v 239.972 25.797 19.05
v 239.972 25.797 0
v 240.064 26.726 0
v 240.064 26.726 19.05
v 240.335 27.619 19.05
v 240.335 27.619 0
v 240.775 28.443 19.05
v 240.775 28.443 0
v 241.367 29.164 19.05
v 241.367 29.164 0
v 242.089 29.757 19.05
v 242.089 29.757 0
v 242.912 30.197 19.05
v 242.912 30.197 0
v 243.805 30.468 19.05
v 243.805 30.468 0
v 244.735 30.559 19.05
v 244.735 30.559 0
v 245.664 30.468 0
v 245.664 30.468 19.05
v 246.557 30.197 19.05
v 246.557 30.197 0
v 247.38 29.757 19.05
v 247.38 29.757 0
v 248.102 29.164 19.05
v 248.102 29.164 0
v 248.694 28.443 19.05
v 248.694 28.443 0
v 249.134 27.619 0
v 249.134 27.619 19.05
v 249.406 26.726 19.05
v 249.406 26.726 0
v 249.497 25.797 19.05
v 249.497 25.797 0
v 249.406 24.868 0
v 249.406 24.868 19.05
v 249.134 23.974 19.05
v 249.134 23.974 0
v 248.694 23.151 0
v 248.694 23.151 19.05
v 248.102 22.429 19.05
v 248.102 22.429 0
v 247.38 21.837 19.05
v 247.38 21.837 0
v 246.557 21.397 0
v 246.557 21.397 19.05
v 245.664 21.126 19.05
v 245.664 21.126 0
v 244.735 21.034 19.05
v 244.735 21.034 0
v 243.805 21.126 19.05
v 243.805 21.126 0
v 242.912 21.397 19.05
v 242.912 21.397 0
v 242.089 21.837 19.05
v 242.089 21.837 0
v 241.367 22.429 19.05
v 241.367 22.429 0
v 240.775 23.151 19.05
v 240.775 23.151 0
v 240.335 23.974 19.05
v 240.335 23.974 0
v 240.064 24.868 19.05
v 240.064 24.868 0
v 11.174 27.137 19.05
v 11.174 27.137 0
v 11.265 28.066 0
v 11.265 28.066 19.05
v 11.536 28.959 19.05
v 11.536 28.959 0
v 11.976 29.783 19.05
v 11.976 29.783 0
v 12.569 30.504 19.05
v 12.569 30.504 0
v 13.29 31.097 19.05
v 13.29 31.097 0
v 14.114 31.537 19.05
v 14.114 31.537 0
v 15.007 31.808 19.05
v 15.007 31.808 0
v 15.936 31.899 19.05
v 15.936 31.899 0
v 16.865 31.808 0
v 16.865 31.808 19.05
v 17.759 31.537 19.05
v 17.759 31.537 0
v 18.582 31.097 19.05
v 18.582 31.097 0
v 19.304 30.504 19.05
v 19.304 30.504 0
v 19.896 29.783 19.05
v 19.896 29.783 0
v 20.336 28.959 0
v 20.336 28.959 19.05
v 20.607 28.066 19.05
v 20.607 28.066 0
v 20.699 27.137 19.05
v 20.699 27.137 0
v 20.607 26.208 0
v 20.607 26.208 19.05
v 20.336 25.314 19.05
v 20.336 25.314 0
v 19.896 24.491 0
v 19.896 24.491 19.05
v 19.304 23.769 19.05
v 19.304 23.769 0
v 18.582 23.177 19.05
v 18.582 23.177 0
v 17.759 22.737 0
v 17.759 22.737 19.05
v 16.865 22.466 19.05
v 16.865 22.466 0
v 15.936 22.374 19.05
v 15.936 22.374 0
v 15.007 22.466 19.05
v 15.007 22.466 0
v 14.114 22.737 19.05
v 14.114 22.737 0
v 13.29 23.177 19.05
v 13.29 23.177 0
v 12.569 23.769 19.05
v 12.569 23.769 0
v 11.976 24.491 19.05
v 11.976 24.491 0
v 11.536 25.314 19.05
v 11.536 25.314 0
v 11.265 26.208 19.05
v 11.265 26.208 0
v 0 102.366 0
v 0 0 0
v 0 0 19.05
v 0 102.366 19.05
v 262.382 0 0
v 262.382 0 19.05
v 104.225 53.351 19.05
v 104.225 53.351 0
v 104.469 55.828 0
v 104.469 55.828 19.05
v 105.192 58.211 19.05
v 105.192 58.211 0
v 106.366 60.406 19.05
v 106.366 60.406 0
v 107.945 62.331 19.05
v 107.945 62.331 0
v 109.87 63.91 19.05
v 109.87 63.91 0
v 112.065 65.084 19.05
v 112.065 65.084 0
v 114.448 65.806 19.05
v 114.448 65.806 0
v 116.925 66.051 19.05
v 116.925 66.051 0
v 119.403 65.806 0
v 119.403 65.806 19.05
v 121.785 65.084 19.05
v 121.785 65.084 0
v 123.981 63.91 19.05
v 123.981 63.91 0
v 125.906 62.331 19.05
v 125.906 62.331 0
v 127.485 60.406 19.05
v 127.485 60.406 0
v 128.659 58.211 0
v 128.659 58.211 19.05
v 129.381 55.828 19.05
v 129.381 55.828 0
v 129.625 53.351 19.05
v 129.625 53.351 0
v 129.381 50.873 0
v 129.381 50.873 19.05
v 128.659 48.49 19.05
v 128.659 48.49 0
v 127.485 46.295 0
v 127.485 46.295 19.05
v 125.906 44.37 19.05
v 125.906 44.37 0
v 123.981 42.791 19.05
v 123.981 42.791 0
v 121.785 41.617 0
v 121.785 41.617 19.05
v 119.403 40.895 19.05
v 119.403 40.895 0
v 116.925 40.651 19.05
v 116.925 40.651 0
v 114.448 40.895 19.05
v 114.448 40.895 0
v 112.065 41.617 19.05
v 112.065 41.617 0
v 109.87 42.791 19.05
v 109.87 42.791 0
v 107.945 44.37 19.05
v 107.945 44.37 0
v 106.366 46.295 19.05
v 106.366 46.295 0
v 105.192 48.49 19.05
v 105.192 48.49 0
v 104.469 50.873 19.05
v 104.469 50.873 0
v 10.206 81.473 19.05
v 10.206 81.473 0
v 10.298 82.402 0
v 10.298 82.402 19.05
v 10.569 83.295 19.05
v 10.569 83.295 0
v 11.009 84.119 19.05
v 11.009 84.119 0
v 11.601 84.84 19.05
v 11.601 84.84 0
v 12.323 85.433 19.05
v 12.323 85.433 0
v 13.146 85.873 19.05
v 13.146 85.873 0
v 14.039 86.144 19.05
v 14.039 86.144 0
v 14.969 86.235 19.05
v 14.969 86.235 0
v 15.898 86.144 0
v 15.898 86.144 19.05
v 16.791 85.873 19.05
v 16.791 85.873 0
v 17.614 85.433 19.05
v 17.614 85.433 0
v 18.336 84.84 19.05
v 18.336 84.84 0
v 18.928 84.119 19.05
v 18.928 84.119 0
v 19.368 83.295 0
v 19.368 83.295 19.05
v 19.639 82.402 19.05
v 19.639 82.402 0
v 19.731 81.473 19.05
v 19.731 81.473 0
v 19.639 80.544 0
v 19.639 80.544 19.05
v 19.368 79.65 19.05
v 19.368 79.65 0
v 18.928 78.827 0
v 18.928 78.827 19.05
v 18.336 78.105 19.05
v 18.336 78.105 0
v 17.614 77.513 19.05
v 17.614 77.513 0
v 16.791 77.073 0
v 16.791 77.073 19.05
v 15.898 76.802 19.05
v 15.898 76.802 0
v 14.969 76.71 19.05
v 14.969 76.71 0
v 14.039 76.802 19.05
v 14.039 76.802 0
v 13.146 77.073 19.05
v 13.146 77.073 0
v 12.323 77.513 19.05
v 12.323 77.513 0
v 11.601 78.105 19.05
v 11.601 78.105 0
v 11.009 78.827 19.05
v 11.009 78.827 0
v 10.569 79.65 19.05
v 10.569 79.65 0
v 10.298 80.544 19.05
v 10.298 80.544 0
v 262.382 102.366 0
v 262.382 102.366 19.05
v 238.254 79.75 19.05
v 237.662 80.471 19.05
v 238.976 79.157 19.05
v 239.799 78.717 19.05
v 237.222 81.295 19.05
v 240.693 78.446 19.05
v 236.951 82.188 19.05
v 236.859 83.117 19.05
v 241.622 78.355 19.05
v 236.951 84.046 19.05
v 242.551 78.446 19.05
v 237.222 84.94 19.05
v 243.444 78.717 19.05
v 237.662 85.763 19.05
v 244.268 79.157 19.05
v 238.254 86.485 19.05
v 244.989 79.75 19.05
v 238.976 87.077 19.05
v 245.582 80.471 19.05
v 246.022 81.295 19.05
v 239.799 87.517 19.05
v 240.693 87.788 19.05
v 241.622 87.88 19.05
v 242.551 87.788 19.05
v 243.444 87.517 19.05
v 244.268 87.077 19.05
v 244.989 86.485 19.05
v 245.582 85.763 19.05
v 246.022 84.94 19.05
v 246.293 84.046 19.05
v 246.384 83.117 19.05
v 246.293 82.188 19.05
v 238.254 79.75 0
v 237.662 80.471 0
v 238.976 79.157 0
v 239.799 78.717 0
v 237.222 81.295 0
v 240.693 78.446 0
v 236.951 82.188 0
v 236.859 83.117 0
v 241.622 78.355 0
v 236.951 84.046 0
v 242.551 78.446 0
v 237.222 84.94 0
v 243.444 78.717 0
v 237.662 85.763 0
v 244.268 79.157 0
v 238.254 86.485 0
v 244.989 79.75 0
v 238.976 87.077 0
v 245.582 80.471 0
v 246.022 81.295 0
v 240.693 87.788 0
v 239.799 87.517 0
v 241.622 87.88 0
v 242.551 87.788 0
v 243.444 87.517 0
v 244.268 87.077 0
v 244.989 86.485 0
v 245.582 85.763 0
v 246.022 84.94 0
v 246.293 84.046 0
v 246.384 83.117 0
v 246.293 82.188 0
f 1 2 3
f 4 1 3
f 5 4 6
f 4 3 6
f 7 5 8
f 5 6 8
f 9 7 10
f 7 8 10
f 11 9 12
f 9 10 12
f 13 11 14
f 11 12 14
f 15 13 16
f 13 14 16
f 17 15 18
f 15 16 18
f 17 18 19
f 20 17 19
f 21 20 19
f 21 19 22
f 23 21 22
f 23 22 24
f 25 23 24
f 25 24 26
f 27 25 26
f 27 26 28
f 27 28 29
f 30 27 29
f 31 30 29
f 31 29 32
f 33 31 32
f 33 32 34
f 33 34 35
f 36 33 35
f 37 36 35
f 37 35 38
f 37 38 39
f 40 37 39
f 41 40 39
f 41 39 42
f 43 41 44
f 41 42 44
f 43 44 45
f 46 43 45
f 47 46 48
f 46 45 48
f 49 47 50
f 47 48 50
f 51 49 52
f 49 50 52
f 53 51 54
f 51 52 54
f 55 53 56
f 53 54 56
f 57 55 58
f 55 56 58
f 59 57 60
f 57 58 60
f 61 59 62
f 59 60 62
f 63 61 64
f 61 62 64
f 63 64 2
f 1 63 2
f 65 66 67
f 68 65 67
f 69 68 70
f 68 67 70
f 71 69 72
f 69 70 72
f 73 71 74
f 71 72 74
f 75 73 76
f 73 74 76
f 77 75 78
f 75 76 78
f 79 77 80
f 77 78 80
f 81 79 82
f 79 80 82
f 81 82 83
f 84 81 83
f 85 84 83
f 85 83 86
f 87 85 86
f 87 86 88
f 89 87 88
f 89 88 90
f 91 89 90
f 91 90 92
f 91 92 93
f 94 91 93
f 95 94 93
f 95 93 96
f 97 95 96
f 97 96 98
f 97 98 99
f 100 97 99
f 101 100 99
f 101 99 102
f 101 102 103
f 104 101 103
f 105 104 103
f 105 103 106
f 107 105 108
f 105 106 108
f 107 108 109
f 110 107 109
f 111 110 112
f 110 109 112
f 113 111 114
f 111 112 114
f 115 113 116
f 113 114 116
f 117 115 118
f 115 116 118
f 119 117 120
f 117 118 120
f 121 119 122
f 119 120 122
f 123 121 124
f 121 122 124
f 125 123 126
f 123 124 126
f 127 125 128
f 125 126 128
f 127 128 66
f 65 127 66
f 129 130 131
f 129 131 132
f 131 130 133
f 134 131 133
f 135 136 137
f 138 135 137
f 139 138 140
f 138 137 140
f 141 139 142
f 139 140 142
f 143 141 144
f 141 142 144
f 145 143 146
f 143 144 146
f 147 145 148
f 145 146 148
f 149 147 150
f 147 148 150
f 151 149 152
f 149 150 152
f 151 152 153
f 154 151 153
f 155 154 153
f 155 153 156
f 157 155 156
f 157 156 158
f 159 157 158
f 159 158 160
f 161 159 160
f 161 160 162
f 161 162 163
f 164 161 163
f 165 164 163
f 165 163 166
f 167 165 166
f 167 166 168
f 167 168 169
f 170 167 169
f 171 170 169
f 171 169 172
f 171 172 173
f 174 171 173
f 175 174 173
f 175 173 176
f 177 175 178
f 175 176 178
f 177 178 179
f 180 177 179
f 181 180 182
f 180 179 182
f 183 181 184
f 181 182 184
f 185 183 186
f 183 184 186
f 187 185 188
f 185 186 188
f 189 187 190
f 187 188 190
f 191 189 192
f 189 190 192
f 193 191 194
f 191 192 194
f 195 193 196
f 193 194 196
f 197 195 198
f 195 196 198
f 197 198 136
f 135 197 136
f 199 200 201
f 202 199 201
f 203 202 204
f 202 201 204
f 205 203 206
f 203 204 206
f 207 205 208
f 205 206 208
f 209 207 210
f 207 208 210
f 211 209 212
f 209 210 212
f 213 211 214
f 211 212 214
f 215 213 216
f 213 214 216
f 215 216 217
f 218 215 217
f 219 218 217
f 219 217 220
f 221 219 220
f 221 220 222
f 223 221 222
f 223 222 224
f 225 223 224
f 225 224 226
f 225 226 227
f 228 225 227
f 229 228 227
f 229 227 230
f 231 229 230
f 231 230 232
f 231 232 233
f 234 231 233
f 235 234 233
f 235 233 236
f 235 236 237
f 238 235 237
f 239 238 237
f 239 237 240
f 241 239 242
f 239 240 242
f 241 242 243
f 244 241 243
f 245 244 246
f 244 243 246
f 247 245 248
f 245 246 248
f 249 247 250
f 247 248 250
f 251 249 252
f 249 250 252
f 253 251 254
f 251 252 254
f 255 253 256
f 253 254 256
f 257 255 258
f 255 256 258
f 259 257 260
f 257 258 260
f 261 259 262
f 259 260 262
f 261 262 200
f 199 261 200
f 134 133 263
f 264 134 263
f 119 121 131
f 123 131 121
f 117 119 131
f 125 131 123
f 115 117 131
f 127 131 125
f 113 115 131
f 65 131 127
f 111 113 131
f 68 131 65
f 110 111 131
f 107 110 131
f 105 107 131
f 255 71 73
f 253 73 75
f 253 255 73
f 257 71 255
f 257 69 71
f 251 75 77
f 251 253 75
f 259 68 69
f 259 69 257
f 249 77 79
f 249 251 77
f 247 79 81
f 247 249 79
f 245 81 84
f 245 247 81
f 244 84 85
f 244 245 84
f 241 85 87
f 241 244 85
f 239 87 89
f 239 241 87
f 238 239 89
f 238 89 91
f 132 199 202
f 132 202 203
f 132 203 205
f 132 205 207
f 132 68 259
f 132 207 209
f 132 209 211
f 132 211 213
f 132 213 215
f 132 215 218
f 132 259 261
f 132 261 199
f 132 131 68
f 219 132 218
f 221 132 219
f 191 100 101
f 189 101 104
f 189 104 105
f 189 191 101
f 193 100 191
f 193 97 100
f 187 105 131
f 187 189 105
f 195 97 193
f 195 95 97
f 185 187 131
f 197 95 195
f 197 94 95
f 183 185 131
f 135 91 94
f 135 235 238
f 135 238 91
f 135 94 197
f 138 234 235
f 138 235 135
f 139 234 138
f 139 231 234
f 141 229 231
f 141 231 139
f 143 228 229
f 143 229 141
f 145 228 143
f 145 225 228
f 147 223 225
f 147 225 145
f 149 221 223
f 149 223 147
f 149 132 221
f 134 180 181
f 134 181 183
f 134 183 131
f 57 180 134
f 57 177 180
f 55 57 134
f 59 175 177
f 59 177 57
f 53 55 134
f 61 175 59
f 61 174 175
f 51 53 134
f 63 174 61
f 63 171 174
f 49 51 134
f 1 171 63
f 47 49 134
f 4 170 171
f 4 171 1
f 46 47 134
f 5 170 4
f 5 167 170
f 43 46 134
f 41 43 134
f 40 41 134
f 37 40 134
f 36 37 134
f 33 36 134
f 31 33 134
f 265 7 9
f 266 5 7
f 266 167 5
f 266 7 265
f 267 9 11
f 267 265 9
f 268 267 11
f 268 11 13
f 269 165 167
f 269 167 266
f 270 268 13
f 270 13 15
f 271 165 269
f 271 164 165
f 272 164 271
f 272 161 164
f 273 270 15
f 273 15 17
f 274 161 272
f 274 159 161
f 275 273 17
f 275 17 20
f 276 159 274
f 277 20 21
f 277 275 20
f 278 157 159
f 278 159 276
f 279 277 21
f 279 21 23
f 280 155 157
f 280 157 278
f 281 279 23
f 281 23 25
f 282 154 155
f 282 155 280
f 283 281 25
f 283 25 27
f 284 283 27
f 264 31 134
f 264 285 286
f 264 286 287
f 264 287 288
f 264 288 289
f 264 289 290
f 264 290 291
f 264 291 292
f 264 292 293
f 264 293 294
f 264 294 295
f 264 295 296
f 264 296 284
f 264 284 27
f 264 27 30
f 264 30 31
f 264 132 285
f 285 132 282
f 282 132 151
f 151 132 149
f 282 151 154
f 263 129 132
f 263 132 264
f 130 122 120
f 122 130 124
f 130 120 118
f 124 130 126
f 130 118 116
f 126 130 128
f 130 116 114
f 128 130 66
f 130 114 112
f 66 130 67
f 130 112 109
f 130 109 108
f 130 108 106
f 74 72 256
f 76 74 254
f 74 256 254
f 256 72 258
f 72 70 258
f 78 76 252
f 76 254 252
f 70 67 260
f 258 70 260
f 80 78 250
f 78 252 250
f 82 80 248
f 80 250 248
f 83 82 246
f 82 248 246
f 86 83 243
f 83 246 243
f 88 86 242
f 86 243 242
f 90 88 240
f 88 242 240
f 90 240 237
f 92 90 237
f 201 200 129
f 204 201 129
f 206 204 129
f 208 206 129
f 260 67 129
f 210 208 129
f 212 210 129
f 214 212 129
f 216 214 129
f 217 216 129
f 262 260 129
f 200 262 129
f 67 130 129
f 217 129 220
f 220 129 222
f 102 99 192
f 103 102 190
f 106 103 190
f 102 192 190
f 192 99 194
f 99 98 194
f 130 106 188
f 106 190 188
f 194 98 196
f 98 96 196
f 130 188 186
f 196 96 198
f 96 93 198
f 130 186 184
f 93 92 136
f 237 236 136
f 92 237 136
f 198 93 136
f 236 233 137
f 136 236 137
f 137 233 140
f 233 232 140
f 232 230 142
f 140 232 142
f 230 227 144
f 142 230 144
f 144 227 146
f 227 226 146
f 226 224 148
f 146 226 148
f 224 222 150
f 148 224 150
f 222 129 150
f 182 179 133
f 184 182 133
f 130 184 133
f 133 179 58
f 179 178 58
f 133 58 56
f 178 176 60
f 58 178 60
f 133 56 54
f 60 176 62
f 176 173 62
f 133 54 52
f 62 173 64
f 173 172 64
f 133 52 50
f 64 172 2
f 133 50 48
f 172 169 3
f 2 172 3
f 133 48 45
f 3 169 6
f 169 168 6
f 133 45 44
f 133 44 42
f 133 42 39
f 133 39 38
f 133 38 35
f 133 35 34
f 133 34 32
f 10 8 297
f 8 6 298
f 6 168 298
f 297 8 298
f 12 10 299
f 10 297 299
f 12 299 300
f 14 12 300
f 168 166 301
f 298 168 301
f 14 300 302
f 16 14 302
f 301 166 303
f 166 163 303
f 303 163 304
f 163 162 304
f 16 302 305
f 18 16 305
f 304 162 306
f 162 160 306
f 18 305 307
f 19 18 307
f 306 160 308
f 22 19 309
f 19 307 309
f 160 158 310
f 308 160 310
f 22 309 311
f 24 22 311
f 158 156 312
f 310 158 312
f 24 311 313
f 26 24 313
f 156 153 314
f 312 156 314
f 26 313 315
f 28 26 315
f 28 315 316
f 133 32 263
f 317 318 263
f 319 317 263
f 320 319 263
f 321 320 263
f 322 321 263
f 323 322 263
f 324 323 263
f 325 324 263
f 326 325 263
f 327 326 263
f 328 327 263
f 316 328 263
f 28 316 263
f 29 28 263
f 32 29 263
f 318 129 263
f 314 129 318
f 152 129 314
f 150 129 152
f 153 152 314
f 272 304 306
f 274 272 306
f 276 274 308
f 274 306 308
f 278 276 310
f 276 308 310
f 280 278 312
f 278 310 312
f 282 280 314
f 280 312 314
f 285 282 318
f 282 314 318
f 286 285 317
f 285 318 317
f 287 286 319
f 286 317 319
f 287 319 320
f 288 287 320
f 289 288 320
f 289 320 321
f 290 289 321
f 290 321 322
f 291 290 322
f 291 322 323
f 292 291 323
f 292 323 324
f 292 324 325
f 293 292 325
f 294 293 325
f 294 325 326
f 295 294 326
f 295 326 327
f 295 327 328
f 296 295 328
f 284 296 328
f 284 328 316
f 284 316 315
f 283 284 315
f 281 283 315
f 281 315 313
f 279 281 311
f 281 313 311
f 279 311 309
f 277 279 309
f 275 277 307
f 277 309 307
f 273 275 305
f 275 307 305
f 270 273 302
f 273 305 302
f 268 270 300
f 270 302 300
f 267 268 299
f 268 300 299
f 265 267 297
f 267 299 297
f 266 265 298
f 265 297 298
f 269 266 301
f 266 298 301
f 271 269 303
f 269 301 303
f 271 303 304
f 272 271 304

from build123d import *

# Parameters (mm, degrees)
F0_W     = 262.38215
F0_H     = 102.365531
F1_DEPTH = 19.05
F3_D     = 25.4
F5_D     = 9.525


with BuildPart() as f1:
    # F0 (on Top) → F1 (new body)
    with BuildSketch(Plane.XY):
        with Locations((131.191075, 51.182765)):
            Rectangle(F0_W, F0_H)
    extrude(amount=F1_DEPTH)

    # F3 (through all)
    with Locations(Plane.XY.offset(19.05)):
        with Locations((116.925366, 53.350501)):
            Hole(F3_D / 2)

    # F5 (through all)
    with Locations(Plane.XY.offset(19.05)):
        with Locations((14.968506, 81.472881), (15.936192, 27.136751), (241.621628, 83.117127), (244.734511, 25.796823)):
            Hole(F5_D / 2)


solid = f1.part
